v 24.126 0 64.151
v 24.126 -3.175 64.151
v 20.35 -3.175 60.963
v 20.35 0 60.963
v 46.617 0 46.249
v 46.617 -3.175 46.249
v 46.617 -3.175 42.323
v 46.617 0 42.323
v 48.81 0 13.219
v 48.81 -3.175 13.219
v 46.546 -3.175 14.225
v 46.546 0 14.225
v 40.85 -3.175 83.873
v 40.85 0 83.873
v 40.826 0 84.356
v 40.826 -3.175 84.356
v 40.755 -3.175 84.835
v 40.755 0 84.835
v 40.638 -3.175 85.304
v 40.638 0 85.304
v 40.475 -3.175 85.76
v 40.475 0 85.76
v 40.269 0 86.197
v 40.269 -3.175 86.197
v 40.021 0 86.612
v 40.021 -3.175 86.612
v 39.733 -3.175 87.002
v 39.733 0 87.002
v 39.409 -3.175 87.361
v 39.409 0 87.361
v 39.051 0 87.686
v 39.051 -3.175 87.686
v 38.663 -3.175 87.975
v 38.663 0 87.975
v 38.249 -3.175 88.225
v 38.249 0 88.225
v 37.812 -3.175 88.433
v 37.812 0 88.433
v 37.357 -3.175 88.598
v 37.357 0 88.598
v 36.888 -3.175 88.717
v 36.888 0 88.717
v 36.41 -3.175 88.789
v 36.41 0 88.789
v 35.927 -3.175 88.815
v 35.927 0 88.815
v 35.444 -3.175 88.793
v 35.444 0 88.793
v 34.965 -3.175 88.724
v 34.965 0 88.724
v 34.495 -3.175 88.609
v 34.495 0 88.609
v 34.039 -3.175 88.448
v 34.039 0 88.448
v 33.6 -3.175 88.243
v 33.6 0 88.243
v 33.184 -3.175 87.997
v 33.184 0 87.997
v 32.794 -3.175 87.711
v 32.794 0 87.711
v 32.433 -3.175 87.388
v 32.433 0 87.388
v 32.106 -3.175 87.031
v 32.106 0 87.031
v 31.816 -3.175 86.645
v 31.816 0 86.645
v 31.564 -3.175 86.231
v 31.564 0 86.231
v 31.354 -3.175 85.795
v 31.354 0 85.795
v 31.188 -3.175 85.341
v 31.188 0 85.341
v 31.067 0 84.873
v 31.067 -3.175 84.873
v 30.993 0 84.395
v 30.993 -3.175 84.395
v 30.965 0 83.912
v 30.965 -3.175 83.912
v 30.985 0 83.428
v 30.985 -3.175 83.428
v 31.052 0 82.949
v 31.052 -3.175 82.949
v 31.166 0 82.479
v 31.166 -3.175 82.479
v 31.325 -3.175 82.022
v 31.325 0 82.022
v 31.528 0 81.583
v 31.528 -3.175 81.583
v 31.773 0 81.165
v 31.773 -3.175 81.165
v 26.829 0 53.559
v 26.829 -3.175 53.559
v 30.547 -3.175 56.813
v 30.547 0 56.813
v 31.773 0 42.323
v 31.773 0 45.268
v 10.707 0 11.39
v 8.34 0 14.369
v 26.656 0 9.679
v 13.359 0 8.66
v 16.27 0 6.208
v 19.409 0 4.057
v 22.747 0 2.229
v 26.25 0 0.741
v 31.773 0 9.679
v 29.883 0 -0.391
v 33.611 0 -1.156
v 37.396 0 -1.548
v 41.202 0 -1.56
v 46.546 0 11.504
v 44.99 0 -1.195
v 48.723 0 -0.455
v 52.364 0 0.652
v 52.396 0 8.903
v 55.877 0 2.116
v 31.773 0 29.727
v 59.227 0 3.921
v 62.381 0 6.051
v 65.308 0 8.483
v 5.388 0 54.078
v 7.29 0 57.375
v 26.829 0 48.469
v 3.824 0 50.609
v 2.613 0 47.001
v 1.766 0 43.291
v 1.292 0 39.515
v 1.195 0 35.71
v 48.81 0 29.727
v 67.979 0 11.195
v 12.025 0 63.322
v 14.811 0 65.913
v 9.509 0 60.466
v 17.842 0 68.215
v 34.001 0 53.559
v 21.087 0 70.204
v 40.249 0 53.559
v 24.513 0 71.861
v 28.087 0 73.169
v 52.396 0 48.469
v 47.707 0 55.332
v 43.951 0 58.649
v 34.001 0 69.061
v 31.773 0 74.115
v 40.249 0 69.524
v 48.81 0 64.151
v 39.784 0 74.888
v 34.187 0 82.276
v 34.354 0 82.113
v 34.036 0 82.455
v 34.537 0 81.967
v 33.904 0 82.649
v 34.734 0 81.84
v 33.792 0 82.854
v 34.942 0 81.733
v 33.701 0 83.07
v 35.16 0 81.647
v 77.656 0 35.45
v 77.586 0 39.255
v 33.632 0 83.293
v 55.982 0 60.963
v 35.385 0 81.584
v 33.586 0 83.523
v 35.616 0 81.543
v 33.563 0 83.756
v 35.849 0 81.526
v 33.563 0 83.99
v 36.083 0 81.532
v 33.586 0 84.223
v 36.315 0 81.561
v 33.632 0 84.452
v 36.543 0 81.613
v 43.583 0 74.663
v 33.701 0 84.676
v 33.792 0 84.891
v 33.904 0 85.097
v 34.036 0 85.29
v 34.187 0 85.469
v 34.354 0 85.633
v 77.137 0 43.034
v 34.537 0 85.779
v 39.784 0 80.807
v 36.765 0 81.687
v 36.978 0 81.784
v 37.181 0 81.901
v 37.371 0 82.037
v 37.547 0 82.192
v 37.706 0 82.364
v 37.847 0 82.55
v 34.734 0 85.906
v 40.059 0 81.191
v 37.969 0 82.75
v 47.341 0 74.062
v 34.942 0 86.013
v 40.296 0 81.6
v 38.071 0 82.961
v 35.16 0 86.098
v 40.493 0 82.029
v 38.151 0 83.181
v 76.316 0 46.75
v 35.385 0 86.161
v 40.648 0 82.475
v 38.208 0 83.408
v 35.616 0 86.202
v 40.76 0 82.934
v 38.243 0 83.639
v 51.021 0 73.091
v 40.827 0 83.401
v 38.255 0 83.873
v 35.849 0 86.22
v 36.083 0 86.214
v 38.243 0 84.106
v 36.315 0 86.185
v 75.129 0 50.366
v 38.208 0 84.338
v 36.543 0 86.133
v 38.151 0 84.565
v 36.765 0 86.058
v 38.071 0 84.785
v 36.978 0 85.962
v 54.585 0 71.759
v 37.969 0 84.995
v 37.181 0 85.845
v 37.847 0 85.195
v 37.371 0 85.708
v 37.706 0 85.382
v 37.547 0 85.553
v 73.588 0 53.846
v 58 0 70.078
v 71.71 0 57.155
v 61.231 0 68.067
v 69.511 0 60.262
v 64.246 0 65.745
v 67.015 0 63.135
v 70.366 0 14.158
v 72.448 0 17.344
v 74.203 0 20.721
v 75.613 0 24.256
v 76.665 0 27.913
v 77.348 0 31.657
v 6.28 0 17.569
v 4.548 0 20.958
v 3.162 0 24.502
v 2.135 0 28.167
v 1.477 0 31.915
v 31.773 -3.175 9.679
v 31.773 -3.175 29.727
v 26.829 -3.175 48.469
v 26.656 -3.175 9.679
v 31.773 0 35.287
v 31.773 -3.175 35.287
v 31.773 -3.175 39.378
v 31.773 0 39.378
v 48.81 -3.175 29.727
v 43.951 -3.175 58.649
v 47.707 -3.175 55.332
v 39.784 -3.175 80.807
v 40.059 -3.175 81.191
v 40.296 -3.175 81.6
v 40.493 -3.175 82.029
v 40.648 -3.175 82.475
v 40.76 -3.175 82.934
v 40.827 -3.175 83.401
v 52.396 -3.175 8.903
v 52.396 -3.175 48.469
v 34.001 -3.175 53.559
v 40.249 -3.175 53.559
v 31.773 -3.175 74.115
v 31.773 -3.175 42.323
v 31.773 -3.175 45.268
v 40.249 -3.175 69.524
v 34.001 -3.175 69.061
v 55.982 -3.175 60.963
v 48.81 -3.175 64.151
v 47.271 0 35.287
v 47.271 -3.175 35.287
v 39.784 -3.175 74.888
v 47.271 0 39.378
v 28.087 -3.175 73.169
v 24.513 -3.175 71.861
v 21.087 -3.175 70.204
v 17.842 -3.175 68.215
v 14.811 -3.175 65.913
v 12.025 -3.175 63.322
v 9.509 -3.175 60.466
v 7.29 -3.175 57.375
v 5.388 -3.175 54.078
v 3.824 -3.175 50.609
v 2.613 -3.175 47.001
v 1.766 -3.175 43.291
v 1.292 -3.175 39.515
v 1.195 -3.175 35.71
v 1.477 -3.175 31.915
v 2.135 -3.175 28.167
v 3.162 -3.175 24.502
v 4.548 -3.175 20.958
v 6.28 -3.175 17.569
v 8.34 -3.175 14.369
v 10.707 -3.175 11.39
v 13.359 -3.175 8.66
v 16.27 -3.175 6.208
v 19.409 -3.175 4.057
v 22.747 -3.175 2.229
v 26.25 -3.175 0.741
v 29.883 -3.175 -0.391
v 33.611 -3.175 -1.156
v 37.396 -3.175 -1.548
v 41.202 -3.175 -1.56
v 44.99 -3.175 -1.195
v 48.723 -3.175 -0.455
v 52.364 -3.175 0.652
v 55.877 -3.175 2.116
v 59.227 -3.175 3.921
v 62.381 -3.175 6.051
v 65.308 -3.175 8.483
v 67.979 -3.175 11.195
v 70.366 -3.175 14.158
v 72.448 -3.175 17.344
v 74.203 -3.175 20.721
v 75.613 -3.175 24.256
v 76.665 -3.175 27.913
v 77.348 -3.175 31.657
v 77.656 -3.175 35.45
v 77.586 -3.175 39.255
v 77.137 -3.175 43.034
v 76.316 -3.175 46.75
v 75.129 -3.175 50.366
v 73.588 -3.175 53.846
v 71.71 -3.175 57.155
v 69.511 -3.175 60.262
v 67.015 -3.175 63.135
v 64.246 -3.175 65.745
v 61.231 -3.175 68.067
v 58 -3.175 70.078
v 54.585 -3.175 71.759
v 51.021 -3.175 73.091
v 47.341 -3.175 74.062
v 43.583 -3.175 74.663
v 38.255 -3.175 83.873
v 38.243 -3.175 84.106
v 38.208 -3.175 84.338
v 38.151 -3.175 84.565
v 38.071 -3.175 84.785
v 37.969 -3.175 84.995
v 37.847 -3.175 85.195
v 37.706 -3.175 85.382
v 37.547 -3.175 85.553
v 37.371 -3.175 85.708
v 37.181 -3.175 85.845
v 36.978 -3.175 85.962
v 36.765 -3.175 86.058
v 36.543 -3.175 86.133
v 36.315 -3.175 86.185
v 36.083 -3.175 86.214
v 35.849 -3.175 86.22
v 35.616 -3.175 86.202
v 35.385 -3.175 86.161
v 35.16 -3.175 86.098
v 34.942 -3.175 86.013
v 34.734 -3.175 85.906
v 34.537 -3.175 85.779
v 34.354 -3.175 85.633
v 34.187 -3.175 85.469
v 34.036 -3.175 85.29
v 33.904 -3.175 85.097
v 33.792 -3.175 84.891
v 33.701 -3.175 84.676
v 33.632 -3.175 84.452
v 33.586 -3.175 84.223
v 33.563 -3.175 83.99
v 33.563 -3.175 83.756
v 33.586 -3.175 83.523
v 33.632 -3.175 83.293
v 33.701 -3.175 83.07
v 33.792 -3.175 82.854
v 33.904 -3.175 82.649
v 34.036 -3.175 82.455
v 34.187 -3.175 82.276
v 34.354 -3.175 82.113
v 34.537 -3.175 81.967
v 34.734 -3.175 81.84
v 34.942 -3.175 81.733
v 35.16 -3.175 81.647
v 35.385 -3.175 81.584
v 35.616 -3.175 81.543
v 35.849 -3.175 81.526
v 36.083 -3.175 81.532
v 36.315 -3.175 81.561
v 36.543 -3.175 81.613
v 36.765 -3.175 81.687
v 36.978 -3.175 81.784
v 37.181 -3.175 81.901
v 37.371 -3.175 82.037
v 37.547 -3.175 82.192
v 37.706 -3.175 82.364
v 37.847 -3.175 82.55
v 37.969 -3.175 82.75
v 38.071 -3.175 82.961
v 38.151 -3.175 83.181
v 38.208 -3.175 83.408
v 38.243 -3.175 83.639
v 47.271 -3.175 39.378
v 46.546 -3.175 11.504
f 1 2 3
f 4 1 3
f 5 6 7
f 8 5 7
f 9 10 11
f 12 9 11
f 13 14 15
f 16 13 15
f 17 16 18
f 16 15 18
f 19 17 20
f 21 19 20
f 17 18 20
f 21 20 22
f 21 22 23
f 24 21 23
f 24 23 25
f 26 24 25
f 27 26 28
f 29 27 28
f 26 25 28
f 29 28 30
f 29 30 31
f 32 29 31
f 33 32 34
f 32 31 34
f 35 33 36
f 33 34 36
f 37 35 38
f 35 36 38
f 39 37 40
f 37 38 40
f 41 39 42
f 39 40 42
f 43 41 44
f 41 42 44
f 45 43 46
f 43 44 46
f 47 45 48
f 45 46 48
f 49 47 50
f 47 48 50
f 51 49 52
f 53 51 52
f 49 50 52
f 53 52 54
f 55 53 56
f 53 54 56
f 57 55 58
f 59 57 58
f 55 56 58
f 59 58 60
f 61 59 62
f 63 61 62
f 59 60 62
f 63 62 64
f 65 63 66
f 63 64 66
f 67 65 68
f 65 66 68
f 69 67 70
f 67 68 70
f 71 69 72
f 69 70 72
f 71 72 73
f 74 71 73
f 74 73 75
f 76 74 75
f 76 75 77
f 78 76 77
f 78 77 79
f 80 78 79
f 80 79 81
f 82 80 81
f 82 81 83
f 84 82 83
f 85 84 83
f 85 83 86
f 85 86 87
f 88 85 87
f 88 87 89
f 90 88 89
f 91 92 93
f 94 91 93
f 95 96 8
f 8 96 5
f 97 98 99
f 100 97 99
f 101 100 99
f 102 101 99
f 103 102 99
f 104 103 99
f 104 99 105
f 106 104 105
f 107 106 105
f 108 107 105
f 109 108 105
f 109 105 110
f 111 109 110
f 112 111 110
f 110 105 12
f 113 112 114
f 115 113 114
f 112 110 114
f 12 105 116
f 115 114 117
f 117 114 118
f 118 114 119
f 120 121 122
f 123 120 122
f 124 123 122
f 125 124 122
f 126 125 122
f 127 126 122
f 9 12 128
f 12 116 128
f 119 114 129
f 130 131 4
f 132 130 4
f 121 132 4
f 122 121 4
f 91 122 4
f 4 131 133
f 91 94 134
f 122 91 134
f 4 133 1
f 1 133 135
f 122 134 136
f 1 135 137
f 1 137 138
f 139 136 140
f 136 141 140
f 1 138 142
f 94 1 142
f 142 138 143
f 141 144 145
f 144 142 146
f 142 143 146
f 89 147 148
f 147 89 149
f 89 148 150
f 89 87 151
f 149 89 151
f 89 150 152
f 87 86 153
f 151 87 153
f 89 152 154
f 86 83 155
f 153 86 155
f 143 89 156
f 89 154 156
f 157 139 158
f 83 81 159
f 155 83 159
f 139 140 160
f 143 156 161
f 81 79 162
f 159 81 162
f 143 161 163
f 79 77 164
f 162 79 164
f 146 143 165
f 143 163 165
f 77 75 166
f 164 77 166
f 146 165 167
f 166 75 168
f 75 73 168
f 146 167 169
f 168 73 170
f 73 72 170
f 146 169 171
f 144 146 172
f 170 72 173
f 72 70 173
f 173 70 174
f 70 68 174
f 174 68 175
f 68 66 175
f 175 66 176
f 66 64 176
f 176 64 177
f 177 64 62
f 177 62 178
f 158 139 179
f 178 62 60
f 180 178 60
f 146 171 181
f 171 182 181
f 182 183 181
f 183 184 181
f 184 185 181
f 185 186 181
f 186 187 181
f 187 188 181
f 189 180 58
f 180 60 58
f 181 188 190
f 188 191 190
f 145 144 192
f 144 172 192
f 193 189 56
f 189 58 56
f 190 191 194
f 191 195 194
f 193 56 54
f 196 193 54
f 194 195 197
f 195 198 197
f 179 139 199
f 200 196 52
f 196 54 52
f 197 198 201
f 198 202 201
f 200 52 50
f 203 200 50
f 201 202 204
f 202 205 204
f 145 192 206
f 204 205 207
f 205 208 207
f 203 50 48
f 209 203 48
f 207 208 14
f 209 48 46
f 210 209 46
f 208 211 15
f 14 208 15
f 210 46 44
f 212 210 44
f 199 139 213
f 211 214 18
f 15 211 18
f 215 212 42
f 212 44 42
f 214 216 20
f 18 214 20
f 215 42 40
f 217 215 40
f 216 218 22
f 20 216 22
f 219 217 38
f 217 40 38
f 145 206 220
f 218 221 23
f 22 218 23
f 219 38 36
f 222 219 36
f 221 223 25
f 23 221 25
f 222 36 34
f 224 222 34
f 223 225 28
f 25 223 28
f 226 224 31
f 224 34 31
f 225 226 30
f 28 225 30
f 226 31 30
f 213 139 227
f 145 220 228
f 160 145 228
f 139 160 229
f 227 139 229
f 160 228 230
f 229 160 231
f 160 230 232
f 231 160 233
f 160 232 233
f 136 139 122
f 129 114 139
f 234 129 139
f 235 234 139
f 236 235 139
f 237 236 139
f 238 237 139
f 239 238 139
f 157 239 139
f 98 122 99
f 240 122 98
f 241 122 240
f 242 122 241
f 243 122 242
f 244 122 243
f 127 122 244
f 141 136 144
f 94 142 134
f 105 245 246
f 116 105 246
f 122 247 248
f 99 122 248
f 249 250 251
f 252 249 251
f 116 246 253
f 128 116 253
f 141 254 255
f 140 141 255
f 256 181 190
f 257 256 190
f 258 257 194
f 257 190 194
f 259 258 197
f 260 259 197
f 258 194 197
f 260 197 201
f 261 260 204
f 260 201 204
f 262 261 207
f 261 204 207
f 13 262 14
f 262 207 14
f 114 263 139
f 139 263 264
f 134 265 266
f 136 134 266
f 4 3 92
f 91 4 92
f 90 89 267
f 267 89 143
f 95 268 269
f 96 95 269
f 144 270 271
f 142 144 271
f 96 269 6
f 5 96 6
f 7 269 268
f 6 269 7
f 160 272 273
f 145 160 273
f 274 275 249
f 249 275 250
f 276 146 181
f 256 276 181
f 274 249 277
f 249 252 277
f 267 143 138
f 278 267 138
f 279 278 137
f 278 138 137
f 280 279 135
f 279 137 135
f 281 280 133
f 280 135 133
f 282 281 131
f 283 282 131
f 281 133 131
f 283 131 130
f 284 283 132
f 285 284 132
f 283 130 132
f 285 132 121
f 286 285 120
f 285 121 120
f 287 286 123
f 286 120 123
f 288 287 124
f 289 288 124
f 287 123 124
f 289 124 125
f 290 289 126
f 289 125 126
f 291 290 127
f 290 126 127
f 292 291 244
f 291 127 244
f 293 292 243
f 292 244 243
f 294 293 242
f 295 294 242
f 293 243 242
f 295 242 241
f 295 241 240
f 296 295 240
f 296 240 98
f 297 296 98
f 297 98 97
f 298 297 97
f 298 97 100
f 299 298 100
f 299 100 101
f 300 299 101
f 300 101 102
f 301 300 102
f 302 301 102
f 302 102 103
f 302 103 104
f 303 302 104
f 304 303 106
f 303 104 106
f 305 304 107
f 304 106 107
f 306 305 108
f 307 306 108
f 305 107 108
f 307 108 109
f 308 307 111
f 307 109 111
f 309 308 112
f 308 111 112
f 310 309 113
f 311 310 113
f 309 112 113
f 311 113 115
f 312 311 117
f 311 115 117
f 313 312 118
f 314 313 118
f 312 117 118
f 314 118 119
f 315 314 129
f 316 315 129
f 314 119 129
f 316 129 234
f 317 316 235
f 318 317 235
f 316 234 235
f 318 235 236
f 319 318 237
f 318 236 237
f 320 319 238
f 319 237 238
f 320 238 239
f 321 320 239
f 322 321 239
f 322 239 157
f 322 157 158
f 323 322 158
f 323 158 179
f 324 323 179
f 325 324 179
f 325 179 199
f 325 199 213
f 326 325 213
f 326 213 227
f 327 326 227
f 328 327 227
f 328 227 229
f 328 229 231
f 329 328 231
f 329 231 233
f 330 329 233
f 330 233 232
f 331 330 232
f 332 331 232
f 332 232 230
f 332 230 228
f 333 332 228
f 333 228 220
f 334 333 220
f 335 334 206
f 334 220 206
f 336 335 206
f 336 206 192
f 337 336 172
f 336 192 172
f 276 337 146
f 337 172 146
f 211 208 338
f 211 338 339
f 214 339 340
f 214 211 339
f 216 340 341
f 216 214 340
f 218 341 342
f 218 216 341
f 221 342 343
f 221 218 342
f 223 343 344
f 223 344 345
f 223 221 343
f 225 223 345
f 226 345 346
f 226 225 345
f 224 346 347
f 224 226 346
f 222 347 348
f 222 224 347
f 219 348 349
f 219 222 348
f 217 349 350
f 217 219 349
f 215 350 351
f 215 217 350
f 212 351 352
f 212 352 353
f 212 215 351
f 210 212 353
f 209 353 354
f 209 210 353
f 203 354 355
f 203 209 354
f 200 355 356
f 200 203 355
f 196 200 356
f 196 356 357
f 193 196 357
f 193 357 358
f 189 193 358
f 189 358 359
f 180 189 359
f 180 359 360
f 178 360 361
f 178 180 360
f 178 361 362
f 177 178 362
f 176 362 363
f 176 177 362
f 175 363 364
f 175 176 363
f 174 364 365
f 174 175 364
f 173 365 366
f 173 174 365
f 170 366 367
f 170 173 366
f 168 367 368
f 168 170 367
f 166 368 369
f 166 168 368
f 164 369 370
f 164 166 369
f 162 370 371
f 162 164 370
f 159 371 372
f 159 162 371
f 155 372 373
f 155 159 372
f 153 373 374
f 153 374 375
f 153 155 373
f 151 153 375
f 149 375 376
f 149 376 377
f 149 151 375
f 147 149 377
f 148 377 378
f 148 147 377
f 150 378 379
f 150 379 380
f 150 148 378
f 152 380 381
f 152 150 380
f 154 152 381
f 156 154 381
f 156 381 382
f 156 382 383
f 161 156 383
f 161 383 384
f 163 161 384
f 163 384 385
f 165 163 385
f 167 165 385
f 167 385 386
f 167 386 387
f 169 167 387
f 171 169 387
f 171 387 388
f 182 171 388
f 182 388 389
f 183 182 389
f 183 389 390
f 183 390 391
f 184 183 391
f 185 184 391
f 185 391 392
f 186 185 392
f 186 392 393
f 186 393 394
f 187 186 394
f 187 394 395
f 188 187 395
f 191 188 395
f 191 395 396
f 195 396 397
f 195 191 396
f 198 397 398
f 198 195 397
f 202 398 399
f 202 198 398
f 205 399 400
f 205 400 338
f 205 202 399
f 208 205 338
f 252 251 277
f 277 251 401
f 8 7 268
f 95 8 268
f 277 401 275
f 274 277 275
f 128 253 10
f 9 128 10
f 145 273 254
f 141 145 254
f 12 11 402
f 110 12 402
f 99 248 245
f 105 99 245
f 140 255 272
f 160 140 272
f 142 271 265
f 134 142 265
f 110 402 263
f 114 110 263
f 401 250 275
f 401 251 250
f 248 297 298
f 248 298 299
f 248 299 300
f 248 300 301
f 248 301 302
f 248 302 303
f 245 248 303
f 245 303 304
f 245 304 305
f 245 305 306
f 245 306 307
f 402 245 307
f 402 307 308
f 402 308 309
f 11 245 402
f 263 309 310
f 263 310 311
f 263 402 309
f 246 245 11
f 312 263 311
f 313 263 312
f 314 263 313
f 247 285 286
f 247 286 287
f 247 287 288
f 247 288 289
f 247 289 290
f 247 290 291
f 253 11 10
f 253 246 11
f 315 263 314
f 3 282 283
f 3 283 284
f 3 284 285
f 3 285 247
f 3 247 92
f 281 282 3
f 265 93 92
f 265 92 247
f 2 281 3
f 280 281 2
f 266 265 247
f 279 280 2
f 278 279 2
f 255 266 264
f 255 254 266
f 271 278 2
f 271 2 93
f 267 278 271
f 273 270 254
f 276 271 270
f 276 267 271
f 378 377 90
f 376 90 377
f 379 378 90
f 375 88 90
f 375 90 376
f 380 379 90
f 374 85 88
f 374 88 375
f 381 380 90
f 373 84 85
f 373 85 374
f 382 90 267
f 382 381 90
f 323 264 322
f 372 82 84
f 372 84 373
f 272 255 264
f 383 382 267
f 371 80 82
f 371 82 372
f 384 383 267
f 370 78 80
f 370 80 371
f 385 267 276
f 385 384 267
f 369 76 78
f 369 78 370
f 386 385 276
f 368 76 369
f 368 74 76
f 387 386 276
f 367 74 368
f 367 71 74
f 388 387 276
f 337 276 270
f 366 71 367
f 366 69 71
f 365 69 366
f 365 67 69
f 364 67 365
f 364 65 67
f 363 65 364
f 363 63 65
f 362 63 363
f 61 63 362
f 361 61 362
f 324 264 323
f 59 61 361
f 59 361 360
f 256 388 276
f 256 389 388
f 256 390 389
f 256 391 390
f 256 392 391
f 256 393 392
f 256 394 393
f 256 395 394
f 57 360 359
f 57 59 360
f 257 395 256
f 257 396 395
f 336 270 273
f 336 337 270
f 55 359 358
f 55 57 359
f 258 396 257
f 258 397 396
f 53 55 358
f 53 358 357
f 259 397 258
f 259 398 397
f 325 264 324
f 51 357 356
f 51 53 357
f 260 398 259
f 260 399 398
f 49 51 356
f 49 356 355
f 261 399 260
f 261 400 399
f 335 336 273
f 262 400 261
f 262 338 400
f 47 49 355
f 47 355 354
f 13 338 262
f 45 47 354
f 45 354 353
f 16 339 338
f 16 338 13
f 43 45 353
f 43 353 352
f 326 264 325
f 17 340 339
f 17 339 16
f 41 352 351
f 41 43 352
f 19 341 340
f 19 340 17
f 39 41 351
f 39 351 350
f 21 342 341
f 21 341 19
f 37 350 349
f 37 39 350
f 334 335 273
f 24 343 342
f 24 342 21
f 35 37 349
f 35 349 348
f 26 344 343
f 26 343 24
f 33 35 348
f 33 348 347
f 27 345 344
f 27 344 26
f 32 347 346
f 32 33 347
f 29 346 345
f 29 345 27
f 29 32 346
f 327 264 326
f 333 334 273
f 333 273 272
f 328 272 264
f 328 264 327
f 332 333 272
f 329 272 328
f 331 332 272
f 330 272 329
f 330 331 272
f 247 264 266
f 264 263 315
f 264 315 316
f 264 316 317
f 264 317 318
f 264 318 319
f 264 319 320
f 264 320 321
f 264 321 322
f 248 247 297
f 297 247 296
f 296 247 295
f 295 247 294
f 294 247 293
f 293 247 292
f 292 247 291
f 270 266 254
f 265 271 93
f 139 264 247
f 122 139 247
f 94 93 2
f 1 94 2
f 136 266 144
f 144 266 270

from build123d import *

# Parameters (mm, degrees)
F0_R     = 2.3475480715
F1_DEPTH = 3.175
F3_DEPTH = 3.175


# Not quite as in the source:
# - a feature names something its author has since deleted; it is built from what else it names


with BuildPart() as f1:
    # F0 (on Front) → F1 (new body)
    with BuildSketch(Plane.XZ):
        with BuildLine():
            ThreePointArc((31.7726456889, 74.1154716994), (15.2436424275, 7.0166806556), (77.6749893029, 36.6440773635))
            ThreePointArc((77.6749893029, 36.6440773635), (66.5982509819, 63.5621034518), (39.7841440278, 74.8880881142))
            ThreePointArc((39.7841440278, 74.8880881142), (35.7580139785, 74.7131155477), (31.7726456889, 74.1154716994))
        make_face()
        with BuildLine():
            ThreePointArc((31.7726456889, 74.1154716994), (35.7580139785, 74.7131155477), (39.7841440278, 74.8880881142))
            Line((39.7841440278, 74.8880881142), (39.7841440278, 80.807211974))
            ThreePointArc((39.7841440278, 80.807211974), (35.6867088214, 78.9353641119), (31.7726456889, 81.1653639963))
            Line((31.7726456889, 81.1653639963), (31.7726456889, 74.1154716994))
        make_face()
        with BuildLine():
            ThreePointArc((31.7726456889, 81.1653639963), (35.6867088214, 78.9353641119), (39.7841440278, 80.807211974))
            ThreePointArc((39.7841440278, 80.807211974), (40.5757369766, 82.2500098688), (40.8497276092, 83.8727280498))
            ThreePointArc((40.8497276092, 83.8727280498), (34.4948204969, 88.6088455606), (31.7726456889, 81.1653639963))
        make_face()
        with Locations((35.9074324369, 83.8727280498)):
            Circle(F0_R, mode=Mode.SUBTRACT)
    extrude(amount=F1_DEPTH)

    # F2 (on face) → F3 (cut)
    with BuildSketch(Plane.XZ.offset(3.175)):
        Polygon((24.1258461707, 64.1513620911), (20.3500986099, 60.9632693231), (26.828661561, 53.5591952503), (30.5470783074, 56.8128089679), align=None)
        Polygon((40.2485467494, 69.5242285728), (34.0013615787, 69.061473012), (34.0013615787, 53.5591952503), (40.2485467494, 53.5591952503), align=None)
        Polygon((55.9822022915, 60.9632693231), (48.8095022738, 64.1513620911), (43.9505800605, 58.649495244), (47.7068929317, 55.3321426876), align=None)
        Polygon((52.3958522826, 48.4688952565), (26.828661561, 48.4688952565), (26.6563948244, 9.6785360947), (31.7726456889, 9.6785360947), (31.7726456889, 29.7273341566), (48.8095022738, 29.7273341566), (48.8095022738, 13.2189297204), (46.5458819901, 14.2250545323), (46.5458819901, 11.503547954), (52.3958522826, 8.9033767581), align=None)
        Polygon((34.3574807048, 35.2874398232), (31.7726456889, 35.2874398232), (31.7726456889, 39.3776521087), (47.2710616887, 39.3776521087), (47.2710616887, 35.2874398232), (36.1486673355, 35.2874398232), align=None, mode=Mode.SUBTRACT)
        Polygon((31.7726456889, 42.3226058483), (31.7726456889, 45.2675558627), (46.6166287661, 46.2492071092), (46.6166287661, 42.3226058483), align=None, mode=Mode.SUBTRACT)
    extrude(amount=-F3_DEPTH, mode=Mode.SUBTRACT)


solid = f1.part
